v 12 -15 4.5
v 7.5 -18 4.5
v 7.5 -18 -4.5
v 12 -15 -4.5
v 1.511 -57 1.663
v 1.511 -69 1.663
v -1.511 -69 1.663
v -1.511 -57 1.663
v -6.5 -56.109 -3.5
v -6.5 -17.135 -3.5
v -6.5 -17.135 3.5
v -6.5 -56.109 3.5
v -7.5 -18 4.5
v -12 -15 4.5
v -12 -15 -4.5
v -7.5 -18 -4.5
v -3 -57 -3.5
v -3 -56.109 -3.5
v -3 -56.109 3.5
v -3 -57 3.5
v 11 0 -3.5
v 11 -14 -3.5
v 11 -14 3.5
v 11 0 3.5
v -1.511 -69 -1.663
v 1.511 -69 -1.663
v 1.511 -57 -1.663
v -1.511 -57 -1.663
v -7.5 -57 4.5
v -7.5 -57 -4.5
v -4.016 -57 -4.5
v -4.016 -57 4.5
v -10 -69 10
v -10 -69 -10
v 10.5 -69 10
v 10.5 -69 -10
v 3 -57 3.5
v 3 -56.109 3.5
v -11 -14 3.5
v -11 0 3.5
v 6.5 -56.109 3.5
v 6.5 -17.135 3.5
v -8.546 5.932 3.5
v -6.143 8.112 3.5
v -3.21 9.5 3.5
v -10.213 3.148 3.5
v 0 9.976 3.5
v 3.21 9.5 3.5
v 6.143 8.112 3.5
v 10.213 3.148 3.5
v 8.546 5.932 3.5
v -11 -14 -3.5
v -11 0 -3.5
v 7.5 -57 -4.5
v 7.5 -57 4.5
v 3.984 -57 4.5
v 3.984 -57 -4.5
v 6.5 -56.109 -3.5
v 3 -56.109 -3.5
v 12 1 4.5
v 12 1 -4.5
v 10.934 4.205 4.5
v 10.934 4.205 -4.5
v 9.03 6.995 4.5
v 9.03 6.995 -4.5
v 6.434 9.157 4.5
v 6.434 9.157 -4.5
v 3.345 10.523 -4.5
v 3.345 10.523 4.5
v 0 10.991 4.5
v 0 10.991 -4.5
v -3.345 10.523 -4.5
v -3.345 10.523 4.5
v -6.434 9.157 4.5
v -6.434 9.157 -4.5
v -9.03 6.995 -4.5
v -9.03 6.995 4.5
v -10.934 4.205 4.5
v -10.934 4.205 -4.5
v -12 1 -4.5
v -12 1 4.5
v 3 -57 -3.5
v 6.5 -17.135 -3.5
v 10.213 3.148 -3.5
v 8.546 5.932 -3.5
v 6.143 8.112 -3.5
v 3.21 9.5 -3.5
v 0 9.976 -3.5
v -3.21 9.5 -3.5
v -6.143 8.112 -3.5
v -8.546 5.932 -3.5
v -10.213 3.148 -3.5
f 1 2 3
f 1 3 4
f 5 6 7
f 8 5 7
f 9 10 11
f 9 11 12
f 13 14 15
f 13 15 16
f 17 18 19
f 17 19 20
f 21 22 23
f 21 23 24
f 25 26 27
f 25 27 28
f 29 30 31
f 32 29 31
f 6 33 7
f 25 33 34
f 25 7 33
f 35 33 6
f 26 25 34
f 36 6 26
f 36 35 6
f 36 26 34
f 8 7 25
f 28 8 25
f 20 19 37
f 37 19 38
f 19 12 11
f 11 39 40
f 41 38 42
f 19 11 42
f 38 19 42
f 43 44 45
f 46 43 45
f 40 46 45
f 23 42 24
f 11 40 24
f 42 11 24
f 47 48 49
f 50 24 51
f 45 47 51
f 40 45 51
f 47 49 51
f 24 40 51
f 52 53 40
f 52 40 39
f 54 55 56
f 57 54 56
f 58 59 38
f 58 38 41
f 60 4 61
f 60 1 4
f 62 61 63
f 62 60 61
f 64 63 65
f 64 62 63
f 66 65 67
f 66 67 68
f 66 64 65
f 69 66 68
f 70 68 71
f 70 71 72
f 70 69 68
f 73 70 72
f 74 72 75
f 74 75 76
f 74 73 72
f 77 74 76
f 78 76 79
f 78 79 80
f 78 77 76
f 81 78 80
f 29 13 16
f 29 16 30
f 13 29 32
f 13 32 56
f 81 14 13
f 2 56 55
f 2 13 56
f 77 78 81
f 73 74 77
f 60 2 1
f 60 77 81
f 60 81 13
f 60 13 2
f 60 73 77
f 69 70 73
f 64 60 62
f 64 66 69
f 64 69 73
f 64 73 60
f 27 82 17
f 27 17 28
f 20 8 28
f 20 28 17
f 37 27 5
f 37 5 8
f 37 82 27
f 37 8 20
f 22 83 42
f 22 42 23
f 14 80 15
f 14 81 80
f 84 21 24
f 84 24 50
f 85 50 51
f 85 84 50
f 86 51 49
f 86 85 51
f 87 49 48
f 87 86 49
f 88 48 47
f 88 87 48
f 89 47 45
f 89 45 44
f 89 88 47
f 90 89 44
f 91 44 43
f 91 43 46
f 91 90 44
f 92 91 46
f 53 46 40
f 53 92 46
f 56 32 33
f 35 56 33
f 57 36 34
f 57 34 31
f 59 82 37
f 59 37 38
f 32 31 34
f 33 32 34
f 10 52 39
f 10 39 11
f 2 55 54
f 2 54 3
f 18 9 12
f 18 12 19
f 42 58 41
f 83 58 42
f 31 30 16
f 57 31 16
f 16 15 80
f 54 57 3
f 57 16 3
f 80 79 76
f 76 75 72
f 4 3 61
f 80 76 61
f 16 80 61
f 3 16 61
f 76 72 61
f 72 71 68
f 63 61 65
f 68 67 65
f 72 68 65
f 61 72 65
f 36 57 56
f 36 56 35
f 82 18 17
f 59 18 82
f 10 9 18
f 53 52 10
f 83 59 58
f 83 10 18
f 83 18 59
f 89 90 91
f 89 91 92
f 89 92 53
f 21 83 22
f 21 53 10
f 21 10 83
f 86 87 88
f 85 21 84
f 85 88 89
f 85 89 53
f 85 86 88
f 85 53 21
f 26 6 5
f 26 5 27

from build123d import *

# Parameters (mm, degrees)
RESSALTO_EXTRUS_O2_DEPTH      = 4.5
RESSALTO_EXTRUS_O2_DEPTH_BACK = 4.5
CORTE_EXTRUS_O1_DEPTH         = 3.5
CORTE_EXTRUS_O1_DEPTH_BACK    = 3.5
RESSALTO_EXTRUS_O3_DEPTH      = 10.5
RESSALTO_EXTRUS_O3_DEPTH_BACK = 10
CORTE_EXTRUS_O2_DEPTH         = 20
CORTE_EXTRUS_O2_DEPTH_BACK    = 18.5
ESBO_O6_W                     = 3.02122436
ESBO_O6_H                     = 3.325672956
CORTE_EXTRUS_O3_DEPTH         = 17
CORTE_EXTRUS_O3_DEPTH_BACK    = 12.5


with BuildPart() as part:
    # Esboço1 → Ressalto-extrusão2 (new body, two sides)
    with BuildSketch(Plane.XY) as ressalto_extrus_o2_sk:
        with BuildLine():
            Line((-12, 1), (-12, -15))
            Line((-12, -15), (-7.5, -18))
            Line((-7.5, -18), (-7.5, -57))
            Line((-7.5, -57), (-4, -57))
            Line((-4, -57), (-10, -69))
            Line((-10, -69), (10, -69))
            Line((10, -69), (4, -57))
            Line((4, -57), (7.5, -57))
            Line((7.5, -57), (7.5, -18))
            Line((7.5, -18), (12, -15))
            Line((12, -15), (12, 1))
            ThreePointArc((12, 1), (0, 10.990932971), (-12, 1))
        make_face()
    extrude(amount=RESSALTO_EXTRUS_O2_DEPTH)
    extrude(ressalto_extrus_o2_sk.sketch, amount=-RESSALTO_EXTRUS_O2_DEPTH_BACK)

    # Esboço2 → Corte-extrusão1 (cut, two sides)
    with BuildSketch(Plane.XY) as corte_extrus_o1_sk:
        with BuildLine():
            Line((-8.5, -68), (8.5, -68))
            Line((8.5, -68), (3, -57.063736363))
            Line((3, -57.063736363), (3, -56.109442195))
            Line((3, -56.109442195), (6.5, -56.109442195))
            Line((6.5, -56.109442195), (6.5, -17.135100905))
            Line((6.5, -17.135100905), (11, -14))
            Line((11, -14), (11, 0))
            ThreePointArc((11, 0), (0, 9.976174937), (-11, 0))
            Line((-11, 0), (-11, -14))
            Line((-11, -14), (-6.5, -17.135100905))
            Line((-6.5, -17.135100905), (-6.5, -56.109442195))
            Line((-6.5, -56.109442195), (-3, -56.109442195))
            Line((-3, -56.109442195), (-3, -57.063736363))
            Line((-3, -57.063736363), (-8.5, -68))
        make_face()
    extrude(amount=CORTE_EXTRUS_O1_DEPTH, mode=Mode.SUBTRACT)
    extrude(corte_extrus_o1_sk.sketch, amount=-CORTE_EXTRUS_O1_DEPTH_BACK, mode=Mode.SUBTRACT)

    # Esboço4 → Ressalto-extrusão3 (add, two sides)
    with BuildSketch(Plane(origin=(0, 0, 0), x_dir=(0, 0, -1), z_dir=(1, 0, 0))) as ressalto_extrus_o3_sk:
        Polygon((0, -69), (10, -69), (4.5, -57), (-4.5, -57), (-10, -69), align=None)
    extrude(amount=RESSALTO_EXTRUS_O3_DEPTH)
    extrude(ressalto_extrus_o3_sk.sketch, amount=-RESSALTO_EXTRUS_O3_DEPTH_BACK)

    # Esboço5 → Corte-extrusão2 (cut, two sides)
    with BuildSketch(Plane.XY) as corte_extrus_o2_sk:
        Polygon((-4.015865961, -57), (-10, -69), (-10, -57), align=None)
        Polygon((3.984134039, -57), (10.5, -69), (10.5, -57), align=None)
    extrude(amount=CORTE_EXTRUS_O2_DEPTH, mode=Mode.SUBTRACT)
    extrude(corte_extrus_o2_sk.sketch, amount=-CORTE_EXTRUS_O2_DEPTH_BACK, mode=Mode.SUBTRACT)

    # Esboço6 → Corte-extrusão3 (cut, two sides)
    with BuildSketch(Plane(origin=(0, -69, 0), x_dir=(-1, 0, 0), z_dir=(0, -1, 0))) as corte_extrus_o3_sk:
        Rectangle(ESBO_O6_W, ESBO_O6_H)
    extrude(amount=CORTE_EXTRUS_O3_DEPTH, mode=Mode.SUBTRACT)
    extrude(corte_extrus_o3_sk.sketch, amount=-CORTE_EXTRUS_O3_DEPTH_BACK, mode=Mode.SUBTRACT)


solid = part.part
